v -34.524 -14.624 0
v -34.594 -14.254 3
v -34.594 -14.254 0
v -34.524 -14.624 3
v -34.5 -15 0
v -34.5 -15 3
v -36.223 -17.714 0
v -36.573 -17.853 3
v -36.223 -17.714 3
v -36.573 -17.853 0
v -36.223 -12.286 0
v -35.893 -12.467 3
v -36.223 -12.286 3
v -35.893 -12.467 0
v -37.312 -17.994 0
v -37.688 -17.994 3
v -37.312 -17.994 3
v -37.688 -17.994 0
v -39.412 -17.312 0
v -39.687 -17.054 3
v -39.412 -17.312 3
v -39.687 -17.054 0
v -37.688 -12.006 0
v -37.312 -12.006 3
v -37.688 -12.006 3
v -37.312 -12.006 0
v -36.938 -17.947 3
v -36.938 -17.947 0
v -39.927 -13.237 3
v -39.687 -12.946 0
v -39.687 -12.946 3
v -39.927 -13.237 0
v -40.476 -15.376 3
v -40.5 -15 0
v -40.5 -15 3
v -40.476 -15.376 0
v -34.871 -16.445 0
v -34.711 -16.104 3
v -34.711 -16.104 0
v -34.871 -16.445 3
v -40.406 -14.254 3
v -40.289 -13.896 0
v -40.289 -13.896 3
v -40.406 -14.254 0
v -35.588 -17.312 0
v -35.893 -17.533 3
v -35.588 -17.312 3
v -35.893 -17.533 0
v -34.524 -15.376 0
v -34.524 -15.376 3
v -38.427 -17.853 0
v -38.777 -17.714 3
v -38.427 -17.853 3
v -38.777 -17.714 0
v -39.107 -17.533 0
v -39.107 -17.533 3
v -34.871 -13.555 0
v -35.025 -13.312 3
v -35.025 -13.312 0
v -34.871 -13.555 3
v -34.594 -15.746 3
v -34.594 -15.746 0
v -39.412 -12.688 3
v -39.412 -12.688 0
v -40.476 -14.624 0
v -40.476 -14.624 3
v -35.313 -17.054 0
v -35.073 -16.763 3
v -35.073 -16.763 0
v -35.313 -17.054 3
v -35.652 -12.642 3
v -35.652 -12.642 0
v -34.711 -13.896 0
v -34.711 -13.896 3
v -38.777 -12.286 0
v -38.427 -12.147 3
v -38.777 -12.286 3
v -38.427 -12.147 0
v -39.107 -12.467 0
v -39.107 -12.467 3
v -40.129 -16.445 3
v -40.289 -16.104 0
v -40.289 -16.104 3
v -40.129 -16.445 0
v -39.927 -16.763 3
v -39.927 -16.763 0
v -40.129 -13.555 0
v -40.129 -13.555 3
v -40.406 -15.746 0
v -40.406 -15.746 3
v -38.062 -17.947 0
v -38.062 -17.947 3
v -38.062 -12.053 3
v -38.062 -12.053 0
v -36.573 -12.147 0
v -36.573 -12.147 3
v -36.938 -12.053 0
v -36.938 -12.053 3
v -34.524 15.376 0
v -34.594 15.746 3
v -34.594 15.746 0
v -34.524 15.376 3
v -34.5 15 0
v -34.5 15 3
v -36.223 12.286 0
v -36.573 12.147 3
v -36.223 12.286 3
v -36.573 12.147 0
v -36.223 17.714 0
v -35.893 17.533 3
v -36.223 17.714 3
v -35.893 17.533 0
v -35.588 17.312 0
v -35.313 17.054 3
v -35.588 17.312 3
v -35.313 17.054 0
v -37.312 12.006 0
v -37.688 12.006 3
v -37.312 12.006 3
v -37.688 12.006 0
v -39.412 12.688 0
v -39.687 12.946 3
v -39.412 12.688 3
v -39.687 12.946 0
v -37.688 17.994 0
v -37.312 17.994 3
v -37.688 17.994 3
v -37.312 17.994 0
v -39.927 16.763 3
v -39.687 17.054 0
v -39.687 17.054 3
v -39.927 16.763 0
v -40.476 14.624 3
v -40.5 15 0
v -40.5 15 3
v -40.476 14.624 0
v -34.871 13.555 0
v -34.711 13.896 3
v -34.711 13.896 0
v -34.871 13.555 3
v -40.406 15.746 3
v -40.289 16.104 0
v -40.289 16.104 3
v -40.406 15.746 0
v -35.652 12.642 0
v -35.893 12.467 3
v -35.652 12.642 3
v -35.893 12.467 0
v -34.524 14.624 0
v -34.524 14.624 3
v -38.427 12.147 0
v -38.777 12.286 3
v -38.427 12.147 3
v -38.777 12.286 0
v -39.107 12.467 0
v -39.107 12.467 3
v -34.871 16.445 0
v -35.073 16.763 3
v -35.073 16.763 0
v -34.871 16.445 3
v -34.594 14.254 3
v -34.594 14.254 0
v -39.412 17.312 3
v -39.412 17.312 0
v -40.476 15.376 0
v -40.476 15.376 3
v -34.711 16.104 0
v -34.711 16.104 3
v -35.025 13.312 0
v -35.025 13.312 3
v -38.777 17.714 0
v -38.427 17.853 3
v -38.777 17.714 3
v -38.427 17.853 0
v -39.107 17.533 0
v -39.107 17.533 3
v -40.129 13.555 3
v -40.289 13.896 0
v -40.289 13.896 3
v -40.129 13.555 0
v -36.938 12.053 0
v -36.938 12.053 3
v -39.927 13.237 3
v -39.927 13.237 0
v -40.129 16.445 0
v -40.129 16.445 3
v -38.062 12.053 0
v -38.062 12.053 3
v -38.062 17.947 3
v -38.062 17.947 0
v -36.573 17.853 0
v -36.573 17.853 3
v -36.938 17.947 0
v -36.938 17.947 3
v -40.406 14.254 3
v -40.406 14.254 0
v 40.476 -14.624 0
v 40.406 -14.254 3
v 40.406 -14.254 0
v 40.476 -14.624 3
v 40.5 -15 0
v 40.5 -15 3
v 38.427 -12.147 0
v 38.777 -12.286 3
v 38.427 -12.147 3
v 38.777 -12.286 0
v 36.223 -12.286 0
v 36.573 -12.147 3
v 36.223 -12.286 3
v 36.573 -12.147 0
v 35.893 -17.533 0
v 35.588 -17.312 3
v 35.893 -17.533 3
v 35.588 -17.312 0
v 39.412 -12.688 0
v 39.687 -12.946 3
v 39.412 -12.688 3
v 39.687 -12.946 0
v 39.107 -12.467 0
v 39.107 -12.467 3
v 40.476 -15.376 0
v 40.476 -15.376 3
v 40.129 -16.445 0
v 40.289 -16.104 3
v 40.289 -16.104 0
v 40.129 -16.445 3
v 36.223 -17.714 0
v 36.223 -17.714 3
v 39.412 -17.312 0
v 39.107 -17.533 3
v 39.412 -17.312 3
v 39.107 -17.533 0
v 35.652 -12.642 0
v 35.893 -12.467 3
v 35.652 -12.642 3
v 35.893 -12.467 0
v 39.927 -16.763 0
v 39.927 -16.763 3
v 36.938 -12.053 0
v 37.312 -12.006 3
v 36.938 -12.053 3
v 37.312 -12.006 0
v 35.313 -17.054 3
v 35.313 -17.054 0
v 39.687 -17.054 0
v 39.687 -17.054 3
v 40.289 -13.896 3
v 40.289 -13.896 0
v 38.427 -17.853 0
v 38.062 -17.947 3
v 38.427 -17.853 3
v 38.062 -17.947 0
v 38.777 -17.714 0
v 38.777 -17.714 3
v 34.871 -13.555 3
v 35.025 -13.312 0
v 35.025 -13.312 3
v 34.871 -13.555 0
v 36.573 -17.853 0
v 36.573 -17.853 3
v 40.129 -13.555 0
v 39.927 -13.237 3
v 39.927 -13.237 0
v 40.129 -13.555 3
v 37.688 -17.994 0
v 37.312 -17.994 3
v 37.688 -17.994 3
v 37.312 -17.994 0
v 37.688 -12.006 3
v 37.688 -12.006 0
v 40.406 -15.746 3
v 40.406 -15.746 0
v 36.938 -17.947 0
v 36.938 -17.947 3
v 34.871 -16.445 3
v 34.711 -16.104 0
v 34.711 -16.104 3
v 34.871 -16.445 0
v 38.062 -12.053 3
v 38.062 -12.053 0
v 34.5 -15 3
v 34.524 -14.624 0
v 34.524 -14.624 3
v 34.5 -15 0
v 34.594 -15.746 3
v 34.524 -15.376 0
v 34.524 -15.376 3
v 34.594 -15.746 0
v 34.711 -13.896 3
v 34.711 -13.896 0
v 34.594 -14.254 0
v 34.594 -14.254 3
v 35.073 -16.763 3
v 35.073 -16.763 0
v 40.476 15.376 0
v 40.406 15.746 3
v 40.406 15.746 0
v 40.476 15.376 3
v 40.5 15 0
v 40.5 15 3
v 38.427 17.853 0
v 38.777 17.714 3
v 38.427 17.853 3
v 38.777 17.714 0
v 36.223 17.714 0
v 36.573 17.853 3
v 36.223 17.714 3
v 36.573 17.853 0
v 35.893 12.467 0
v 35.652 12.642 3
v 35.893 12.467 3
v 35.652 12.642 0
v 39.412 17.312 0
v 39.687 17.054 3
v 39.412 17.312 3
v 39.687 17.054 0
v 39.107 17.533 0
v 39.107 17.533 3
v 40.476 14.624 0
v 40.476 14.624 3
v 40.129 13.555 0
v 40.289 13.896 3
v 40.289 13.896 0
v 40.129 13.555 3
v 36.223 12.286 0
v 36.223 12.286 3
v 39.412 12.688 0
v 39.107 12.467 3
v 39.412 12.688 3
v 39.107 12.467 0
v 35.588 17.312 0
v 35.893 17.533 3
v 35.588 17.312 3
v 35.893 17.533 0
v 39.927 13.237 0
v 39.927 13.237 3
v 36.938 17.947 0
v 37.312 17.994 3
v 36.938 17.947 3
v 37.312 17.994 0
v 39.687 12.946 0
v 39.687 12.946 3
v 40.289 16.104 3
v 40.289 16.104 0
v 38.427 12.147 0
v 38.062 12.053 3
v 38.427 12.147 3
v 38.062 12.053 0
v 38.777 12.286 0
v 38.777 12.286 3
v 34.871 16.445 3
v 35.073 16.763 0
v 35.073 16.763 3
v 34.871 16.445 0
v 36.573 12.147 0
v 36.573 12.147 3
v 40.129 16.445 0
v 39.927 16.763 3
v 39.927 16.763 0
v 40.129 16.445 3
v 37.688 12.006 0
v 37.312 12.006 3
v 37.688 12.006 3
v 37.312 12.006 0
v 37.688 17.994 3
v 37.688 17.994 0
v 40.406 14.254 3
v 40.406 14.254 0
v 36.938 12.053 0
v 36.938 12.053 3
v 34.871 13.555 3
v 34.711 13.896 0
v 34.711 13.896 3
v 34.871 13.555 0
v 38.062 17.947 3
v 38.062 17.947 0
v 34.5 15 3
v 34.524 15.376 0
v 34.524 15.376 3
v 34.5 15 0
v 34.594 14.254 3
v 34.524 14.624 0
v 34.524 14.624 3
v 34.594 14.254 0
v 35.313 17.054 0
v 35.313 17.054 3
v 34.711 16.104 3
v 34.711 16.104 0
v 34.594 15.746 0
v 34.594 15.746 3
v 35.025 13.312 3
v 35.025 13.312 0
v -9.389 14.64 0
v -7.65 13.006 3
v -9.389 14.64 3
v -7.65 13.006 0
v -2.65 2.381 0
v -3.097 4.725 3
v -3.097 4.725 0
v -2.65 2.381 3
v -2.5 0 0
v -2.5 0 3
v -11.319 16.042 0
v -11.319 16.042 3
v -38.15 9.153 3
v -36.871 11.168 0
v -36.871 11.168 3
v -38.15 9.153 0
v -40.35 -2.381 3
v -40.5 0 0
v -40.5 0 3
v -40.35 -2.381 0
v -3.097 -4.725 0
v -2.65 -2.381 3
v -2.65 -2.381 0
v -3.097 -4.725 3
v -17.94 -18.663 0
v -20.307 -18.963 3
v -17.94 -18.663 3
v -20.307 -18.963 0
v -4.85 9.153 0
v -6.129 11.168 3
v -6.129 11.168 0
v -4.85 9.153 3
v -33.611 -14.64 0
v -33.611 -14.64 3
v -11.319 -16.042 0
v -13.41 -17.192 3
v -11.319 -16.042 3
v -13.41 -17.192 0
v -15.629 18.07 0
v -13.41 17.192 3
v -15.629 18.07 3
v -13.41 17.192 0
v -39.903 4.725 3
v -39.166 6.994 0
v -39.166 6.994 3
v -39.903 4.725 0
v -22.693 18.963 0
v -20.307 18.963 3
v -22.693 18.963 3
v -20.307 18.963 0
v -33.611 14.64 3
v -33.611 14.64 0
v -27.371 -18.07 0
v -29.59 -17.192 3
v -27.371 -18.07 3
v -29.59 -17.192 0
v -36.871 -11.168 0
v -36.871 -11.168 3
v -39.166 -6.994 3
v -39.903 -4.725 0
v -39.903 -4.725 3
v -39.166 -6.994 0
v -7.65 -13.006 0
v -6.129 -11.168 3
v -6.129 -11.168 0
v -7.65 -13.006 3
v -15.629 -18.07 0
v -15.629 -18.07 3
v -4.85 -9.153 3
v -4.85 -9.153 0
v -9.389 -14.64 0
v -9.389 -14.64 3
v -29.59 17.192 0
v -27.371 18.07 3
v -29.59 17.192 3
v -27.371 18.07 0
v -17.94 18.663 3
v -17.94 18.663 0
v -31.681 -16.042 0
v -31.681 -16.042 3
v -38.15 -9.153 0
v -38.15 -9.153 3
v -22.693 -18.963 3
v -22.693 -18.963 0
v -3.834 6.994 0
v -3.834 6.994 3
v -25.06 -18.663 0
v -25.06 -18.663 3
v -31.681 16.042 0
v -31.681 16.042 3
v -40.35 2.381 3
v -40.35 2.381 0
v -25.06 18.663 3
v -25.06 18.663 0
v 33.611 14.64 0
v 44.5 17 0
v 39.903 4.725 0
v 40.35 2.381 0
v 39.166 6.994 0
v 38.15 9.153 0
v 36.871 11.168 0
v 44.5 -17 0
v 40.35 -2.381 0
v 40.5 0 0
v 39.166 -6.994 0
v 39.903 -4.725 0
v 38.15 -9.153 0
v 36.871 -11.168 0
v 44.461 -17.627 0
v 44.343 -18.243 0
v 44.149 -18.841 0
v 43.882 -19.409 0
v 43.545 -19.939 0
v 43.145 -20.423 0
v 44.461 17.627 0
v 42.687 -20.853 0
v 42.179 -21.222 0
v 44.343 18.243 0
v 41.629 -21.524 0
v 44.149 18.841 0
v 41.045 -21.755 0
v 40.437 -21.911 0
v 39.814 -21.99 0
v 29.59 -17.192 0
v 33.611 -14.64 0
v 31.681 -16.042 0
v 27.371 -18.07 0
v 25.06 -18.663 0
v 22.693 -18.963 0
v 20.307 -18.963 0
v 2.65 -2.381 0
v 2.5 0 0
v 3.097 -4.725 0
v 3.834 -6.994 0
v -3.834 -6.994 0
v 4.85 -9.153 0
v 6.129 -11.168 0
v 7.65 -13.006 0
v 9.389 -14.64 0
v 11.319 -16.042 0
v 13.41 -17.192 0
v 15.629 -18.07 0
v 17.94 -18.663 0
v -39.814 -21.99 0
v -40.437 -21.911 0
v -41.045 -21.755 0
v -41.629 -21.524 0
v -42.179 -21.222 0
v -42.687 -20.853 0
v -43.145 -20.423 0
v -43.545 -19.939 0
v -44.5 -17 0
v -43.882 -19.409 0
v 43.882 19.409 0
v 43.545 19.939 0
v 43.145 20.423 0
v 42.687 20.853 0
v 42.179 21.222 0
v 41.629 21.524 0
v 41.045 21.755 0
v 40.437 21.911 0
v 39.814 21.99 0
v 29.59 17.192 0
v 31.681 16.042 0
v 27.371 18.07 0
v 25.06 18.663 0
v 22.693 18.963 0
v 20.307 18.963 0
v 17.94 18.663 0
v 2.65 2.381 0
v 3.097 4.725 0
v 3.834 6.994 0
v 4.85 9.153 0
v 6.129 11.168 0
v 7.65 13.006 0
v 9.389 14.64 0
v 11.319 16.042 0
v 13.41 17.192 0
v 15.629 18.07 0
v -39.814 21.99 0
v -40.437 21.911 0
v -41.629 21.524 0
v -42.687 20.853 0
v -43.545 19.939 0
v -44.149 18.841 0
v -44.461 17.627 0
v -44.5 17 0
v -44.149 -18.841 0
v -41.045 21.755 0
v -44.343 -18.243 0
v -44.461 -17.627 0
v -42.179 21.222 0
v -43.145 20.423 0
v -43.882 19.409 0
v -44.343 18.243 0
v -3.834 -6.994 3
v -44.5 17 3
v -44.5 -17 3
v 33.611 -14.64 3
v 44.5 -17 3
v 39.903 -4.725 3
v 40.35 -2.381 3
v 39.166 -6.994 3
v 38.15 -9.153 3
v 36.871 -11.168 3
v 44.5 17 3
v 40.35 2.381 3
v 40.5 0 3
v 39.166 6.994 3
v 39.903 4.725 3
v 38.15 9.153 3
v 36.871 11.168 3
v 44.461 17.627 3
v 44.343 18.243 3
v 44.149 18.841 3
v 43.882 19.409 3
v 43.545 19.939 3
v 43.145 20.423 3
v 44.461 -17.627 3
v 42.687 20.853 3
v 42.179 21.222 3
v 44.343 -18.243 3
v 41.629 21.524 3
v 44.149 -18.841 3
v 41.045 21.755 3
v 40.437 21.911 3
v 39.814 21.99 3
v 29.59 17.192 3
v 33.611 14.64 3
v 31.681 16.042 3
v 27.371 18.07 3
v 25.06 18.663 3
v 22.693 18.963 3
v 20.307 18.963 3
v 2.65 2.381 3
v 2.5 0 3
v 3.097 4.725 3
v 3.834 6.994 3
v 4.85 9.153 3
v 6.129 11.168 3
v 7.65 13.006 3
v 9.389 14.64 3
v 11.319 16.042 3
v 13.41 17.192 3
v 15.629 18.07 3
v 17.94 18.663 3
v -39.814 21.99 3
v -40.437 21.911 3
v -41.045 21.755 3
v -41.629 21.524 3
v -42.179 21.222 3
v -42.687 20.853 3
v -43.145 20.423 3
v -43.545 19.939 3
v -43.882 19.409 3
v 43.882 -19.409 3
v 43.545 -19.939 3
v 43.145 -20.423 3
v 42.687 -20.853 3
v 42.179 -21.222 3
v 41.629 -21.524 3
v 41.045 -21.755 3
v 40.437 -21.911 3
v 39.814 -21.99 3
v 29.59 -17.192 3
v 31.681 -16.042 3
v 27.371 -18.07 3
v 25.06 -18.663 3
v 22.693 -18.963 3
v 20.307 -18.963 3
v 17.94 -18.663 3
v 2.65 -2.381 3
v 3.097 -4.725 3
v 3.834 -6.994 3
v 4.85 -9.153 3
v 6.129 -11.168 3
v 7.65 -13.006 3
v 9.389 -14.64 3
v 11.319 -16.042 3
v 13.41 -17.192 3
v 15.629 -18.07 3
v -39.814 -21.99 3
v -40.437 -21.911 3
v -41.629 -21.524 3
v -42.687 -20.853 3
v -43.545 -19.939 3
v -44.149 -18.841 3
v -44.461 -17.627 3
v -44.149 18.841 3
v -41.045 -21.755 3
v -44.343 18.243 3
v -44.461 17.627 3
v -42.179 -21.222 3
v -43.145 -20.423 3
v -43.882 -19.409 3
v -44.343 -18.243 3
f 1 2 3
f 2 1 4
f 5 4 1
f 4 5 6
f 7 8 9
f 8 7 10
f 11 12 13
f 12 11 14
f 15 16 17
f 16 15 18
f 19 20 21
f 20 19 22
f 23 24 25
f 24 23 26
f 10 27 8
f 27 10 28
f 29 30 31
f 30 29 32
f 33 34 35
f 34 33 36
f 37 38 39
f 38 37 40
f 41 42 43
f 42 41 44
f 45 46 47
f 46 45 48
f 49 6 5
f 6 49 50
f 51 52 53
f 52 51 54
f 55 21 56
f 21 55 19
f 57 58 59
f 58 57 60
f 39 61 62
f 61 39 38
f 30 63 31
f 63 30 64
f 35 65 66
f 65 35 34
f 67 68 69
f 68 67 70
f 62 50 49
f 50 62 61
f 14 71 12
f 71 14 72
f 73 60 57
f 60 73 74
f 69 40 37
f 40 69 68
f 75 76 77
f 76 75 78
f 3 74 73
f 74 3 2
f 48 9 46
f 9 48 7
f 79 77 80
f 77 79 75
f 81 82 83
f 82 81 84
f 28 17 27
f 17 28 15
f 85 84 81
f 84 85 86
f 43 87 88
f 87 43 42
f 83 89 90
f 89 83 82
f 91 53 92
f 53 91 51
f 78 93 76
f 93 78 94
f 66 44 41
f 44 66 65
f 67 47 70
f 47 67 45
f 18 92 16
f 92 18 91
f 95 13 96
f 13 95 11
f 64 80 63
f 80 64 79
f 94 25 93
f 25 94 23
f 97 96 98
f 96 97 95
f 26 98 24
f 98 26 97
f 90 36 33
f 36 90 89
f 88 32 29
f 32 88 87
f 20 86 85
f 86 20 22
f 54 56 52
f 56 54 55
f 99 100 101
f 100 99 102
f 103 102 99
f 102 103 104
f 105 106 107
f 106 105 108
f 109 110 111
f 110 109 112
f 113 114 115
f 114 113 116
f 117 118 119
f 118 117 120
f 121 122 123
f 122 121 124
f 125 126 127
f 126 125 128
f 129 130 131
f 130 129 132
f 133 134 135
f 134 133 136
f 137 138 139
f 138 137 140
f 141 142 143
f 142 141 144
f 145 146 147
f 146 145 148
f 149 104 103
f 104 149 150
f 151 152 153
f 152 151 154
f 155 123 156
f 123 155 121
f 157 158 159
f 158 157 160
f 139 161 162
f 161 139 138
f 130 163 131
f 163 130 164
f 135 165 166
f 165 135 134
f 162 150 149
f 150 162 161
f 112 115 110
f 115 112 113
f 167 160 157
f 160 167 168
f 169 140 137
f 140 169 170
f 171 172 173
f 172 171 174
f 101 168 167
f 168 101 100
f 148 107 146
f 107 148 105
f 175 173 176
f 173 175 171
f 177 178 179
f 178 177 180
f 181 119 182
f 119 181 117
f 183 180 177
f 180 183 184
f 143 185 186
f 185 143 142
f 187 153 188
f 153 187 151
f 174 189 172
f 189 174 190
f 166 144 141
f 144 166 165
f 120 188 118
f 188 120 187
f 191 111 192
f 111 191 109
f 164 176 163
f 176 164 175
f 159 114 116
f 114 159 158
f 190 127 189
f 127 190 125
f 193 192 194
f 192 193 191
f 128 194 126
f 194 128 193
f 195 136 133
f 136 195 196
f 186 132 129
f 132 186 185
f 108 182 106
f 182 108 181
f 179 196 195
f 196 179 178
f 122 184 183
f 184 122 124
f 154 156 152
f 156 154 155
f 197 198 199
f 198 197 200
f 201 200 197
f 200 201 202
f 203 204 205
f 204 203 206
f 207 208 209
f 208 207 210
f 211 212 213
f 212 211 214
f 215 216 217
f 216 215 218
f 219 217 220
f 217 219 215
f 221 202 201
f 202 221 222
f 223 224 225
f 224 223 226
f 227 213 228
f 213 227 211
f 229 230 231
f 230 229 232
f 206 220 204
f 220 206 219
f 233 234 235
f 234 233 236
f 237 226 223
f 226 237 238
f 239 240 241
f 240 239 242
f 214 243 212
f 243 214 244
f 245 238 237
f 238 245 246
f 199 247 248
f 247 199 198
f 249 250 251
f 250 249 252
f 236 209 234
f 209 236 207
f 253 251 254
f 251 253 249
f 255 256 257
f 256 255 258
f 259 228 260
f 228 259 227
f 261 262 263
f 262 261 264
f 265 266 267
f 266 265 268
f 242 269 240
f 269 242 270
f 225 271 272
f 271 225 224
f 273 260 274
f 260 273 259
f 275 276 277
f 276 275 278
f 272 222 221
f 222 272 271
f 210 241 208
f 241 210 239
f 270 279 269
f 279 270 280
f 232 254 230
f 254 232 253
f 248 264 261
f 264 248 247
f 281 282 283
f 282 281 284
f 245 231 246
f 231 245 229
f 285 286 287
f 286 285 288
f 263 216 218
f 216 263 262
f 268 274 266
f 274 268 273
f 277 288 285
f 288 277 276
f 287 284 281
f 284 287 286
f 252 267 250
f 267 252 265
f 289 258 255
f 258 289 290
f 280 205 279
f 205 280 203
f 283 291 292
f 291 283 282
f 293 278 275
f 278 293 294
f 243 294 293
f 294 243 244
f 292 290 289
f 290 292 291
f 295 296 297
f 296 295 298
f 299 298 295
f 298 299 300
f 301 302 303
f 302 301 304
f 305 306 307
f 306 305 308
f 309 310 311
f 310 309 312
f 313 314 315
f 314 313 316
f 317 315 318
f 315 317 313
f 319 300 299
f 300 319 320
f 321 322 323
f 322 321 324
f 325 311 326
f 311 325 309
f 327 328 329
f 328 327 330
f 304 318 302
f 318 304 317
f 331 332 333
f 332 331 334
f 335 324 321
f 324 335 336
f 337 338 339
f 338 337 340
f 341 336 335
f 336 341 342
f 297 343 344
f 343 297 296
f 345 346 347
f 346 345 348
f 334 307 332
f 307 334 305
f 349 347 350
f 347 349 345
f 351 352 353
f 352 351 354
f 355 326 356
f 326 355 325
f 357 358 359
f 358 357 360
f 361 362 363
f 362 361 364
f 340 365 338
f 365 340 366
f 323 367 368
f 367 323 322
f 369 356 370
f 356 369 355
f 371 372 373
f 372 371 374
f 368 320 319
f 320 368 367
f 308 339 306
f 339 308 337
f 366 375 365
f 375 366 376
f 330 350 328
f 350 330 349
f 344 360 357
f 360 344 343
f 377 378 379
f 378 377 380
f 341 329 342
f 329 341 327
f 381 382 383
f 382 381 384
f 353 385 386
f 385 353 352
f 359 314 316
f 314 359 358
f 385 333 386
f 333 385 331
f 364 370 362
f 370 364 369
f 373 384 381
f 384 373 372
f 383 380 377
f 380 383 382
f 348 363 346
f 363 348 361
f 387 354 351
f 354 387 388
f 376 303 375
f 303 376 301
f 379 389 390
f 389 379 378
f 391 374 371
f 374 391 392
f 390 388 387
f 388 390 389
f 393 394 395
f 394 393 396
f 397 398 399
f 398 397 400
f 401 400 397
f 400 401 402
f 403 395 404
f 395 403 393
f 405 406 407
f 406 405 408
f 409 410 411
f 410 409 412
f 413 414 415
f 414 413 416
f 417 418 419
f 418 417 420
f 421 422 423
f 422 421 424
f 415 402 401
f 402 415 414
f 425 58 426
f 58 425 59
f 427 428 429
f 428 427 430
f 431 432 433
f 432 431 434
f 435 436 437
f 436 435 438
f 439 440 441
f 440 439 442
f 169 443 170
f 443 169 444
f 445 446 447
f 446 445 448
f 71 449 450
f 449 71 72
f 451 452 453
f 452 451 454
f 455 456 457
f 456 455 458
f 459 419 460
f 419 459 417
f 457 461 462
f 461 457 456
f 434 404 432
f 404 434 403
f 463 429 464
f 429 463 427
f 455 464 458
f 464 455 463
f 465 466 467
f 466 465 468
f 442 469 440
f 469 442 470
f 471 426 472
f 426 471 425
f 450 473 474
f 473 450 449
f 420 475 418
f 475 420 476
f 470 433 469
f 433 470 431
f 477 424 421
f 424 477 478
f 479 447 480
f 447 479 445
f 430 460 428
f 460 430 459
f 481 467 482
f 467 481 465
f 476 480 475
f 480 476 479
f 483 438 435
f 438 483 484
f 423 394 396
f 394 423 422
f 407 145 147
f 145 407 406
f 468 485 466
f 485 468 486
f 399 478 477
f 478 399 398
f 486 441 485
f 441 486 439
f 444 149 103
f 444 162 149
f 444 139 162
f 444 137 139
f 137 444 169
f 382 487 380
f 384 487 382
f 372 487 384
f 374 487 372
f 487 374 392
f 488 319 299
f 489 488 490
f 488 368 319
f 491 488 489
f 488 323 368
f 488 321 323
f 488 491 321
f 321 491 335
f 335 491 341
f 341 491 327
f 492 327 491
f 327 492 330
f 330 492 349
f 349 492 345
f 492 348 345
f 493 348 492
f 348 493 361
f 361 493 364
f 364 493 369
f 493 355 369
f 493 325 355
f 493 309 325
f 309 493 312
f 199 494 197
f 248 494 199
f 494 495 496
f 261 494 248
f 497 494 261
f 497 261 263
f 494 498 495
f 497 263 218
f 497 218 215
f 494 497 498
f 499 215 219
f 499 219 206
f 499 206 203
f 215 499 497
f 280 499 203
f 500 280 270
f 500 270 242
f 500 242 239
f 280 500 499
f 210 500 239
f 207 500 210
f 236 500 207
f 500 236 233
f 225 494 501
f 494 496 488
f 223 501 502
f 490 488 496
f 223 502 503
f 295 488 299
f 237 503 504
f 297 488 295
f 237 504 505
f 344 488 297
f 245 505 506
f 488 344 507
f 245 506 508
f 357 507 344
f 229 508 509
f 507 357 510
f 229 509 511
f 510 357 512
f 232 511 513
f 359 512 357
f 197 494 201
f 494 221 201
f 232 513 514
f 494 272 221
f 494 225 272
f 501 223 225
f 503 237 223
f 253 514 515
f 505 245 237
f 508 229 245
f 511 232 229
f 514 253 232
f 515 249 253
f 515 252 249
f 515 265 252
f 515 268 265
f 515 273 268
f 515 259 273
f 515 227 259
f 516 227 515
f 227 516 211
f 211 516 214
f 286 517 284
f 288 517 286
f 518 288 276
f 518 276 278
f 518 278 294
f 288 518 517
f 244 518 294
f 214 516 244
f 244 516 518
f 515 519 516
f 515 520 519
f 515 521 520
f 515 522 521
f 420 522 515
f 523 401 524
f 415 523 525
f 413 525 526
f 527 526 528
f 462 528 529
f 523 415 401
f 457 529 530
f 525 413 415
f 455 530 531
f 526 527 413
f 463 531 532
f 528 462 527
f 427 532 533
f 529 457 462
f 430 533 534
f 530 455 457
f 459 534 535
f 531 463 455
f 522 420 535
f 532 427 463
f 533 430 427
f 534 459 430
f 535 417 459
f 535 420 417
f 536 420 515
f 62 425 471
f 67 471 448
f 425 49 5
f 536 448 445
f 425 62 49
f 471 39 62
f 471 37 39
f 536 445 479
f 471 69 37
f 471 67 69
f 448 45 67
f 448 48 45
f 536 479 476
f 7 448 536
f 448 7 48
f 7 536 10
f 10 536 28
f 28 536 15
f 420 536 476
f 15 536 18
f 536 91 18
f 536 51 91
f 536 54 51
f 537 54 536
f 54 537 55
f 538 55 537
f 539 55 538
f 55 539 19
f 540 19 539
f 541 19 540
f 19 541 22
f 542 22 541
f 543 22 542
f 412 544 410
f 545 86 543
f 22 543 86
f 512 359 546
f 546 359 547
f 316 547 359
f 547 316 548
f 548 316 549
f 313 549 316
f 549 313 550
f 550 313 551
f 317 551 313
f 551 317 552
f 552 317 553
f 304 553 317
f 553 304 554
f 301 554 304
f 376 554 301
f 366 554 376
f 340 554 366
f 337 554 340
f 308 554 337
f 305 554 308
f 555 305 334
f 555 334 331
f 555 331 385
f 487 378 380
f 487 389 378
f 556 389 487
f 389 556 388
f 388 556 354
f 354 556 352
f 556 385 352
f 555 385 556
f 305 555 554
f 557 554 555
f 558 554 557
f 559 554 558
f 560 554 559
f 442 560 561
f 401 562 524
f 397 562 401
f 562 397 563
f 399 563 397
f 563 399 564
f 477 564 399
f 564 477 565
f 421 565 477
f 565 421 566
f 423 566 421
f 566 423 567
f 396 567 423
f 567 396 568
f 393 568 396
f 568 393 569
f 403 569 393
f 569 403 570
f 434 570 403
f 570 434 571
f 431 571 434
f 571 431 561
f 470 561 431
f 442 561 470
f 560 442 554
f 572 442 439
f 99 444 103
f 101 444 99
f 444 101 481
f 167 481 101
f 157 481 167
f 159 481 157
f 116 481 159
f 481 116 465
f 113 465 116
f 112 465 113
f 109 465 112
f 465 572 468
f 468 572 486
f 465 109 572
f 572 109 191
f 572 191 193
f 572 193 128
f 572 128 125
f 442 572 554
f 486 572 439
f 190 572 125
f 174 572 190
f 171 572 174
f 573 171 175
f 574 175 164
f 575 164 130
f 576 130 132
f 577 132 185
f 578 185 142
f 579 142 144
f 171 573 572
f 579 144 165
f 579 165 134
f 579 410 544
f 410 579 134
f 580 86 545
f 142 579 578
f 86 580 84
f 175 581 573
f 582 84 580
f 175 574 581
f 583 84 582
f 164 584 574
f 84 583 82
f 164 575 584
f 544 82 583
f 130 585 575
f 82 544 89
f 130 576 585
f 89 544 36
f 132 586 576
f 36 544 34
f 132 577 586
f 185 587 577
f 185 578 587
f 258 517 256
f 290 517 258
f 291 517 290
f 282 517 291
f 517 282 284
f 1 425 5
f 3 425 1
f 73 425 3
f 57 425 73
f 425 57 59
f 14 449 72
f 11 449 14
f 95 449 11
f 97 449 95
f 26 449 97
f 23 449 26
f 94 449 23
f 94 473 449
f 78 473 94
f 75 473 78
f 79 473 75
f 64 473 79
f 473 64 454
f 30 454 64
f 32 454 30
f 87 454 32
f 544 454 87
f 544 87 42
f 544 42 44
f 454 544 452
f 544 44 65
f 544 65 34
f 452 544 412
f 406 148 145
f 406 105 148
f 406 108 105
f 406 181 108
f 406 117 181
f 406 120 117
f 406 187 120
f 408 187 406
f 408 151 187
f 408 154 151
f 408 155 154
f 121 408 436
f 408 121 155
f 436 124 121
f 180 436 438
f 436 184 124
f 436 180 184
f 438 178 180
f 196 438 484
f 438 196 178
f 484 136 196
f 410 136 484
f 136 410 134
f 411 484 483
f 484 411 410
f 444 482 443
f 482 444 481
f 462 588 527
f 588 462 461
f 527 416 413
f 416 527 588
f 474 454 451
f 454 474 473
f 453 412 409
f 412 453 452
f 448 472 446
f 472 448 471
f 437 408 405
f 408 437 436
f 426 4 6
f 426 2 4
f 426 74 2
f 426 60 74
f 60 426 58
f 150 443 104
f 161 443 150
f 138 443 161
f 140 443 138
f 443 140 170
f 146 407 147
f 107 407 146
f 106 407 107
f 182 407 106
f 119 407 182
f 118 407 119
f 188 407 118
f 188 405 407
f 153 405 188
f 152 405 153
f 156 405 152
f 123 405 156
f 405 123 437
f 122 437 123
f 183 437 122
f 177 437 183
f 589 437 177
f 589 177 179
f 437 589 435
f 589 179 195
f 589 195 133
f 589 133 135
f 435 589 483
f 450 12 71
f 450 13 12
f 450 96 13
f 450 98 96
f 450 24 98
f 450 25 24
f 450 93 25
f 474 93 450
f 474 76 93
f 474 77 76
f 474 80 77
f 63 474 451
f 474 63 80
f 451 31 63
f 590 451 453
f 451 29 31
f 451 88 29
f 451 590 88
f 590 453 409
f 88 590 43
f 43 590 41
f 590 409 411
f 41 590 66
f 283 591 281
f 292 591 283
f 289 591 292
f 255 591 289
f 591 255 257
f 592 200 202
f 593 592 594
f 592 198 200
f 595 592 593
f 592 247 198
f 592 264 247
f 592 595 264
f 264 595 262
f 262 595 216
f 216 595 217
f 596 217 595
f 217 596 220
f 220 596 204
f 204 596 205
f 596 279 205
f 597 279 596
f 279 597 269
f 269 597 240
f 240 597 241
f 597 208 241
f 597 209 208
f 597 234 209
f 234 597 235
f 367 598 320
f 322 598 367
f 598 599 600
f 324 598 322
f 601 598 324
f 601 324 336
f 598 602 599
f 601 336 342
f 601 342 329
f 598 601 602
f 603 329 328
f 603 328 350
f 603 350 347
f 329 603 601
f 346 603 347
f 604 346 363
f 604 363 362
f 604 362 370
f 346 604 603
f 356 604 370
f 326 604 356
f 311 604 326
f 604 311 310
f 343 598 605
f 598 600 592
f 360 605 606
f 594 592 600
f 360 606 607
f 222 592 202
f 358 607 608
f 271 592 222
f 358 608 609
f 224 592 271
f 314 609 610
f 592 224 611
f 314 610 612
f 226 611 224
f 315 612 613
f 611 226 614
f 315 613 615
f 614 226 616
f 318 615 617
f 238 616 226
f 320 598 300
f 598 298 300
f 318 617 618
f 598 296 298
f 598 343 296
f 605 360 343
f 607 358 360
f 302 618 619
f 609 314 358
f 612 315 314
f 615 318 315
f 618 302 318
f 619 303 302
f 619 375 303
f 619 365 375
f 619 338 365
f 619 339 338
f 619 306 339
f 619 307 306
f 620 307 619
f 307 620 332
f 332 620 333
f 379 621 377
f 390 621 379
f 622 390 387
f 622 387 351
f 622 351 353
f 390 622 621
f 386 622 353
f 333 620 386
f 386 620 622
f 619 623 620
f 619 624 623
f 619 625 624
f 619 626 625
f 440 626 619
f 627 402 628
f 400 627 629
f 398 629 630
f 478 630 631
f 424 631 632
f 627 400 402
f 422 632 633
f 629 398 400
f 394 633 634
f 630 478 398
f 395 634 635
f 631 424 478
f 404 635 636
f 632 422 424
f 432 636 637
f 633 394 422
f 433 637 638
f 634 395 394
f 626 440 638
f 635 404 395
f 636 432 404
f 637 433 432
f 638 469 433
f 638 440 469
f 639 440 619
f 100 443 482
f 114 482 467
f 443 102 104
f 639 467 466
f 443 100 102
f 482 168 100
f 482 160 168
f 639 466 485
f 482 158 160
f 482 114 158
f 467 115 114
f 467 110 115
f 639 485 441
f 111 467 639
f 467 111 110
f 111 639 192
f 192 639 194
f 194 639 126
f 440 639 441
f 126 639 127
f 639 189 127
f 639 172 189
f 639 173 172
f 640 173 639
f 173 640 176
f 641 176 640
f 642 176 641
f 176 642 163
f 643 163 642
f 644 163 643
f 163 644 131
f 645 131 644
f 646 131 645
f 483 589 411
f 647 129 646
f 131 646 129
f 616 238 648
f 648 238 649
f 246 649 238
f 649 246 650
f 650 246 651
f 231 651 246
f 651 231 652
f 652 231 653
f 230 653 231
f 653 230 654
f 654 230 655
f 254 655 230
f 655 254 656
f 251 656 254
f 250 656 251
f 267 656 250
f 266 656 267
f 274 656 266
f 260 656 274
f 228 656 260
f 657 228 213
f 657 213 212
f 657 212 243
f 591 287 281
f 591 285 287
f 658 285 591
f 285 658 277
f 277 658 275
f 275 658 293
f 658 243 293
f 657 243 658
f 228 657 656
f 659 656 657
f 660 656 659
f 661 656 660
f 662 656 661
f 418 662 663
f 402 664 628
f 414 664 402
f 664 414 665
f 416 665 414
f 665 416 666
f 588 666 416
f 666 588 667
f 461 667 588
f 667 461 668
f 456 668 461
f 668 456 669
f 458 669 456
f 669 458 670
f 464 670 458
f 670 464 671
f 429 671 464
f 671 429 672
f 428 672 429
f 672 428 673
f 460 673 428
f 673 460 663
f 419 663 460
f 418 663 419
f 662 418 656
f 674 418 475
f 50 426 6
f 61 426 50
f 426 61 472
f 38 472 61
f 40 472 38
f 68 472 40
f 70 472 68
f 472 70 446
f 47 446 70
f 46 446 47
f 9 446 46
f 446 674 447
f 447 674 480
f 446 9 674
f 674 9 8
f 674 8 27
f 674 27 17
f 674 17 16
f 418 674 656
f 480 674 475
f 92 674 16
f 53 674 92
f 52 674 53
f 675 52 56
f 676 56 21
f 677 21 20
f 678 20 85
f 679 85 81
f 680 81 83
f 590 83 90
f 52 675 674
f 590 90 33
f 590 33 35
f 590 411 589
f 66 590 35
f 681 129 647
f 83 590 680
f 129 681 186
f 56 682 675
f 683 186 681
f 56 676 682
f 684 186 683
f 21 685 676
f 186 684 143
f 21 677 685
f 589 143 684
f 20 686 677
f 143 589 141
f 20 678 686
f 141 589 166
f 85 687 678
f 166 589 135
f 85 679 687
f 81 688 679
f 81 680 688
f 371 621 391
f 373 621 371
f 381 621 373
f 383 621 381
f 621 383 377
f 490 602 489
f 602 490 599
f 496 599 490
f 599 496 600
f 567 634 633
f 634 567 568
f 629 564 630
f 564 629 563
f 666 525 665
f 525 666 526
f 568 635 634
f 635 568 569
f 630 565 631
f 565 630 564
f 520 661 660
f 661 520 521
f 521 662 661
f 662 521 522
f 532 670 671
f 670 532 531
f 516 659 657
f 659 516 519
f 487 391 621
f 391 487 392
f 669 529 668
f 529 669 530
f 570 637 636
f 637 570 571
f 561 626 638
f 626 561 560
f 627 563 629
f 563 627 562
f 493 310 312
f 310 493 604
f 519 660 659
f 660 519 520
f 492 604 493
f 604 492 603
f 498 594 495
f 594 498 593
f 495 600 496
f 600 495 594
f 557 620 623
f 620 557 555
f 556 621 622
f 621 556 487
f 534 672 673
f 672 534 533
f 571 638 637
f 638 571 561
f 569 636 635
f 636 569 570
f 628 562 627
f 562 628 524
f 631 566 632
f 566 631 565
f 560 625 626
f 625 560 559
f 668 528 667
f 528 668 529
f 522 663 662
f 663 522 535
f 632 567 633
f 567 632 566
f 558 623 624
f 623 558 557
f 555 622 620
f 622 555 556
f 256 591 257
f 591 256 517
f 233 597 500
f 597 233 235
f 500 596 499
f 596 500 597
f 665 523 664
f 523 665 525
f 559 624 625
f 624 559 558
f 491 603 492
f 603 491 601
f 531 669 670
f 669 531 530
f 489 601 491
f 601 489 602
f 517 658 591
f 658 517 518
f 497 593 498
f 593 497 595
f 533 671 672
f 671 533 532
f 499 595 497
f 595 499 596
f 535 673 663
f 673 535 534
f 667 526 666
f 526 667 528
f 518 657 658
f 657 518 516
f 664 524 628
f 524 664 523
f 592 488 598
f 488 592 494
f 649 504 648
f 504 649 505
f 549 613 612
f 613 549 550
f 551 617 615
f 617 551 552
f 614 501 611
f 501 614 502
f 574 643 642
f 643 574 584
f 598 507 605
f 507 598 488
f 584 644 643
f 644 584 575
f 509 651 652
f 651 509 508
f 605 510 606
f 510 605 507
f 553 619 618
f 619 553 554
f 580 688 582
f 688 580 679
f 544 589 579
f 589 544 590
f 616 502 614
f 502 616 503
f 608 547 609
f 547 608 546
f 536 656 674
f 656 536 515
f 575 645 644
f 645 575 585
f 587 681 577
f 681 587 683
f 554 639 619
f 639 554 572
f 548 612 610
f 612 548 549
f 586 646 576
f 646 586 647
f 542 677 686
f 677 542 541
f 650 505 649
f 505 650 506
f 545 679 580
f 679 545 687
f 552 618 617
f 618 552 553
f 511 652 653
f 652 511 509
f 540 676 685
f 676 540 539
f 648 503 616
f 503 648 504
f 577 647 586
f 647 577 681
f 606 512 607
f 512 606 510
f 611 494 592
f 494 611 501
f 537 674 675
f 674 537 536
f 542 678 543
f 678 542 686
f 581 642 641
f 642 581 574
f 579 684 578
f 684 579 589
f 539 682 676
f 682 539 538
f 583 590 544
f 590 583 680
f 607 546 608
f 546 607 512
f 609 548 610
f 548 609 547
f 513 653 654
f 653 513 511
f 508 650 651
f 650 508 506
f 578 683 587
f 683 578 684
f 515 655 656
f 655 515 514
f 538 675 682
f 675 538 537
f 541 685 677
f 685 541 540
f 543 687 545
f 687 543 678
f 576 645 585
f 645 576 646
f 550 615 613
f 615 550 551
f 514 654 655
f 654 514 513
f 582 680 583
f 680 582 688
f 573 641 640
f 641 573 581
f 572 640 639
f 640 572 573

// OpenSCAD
$fn = 50;


difference() {
	union() {
		hull() {
			translate(v = [-39.5000000000, 17.0000000000, 0]) {
				cylinder(h = 3, r = 5);
			}
			translate(v = [39.5000000000, 17.0000000000, 0]) {
				cylinder(h = 3, r = 5);
			}
			translate(v = [-39.5000000000, -17.0000000000, 0]) {
				cylinder(h = 3, r = 5);
			}
			translate(v = [39.5000000000, -17.0000000000, 0]) {
				cylinder(h = 3, r = 5);
			}
		}
	}
	union() {
		#translate(v = [-37.5000000000, -15.0000000000, -100.0000000000]) {
			cylinder(h = 200, r = 3.0000000000);
		}
		#translate(v = [-37.5000000000, 15.0000000000, -100.0000000000]) {
			cylinder(h = 200, r = 3.0000000000);
		}
		#translate(v = [37.5000000000, -15.0000000000, -100.0000000000]) {
			cylinder(h = 200, r = 3.0000000000);
		}
		#translate(v = [37.5000000000, 15.0000000000, -100.0000000000]) {
			cylinder(h = 200, r = 3.0000000000);
		}
		#translate(v = [-21.5000000000, 0, 0]) {
			cylinder(h = 3, r = 19.0000000000);
		}
		#translate(v = [21.5000000000, 0, 0]) {
			cylinder(h = 3, r = 19.0000000000);
		}
	}
}
